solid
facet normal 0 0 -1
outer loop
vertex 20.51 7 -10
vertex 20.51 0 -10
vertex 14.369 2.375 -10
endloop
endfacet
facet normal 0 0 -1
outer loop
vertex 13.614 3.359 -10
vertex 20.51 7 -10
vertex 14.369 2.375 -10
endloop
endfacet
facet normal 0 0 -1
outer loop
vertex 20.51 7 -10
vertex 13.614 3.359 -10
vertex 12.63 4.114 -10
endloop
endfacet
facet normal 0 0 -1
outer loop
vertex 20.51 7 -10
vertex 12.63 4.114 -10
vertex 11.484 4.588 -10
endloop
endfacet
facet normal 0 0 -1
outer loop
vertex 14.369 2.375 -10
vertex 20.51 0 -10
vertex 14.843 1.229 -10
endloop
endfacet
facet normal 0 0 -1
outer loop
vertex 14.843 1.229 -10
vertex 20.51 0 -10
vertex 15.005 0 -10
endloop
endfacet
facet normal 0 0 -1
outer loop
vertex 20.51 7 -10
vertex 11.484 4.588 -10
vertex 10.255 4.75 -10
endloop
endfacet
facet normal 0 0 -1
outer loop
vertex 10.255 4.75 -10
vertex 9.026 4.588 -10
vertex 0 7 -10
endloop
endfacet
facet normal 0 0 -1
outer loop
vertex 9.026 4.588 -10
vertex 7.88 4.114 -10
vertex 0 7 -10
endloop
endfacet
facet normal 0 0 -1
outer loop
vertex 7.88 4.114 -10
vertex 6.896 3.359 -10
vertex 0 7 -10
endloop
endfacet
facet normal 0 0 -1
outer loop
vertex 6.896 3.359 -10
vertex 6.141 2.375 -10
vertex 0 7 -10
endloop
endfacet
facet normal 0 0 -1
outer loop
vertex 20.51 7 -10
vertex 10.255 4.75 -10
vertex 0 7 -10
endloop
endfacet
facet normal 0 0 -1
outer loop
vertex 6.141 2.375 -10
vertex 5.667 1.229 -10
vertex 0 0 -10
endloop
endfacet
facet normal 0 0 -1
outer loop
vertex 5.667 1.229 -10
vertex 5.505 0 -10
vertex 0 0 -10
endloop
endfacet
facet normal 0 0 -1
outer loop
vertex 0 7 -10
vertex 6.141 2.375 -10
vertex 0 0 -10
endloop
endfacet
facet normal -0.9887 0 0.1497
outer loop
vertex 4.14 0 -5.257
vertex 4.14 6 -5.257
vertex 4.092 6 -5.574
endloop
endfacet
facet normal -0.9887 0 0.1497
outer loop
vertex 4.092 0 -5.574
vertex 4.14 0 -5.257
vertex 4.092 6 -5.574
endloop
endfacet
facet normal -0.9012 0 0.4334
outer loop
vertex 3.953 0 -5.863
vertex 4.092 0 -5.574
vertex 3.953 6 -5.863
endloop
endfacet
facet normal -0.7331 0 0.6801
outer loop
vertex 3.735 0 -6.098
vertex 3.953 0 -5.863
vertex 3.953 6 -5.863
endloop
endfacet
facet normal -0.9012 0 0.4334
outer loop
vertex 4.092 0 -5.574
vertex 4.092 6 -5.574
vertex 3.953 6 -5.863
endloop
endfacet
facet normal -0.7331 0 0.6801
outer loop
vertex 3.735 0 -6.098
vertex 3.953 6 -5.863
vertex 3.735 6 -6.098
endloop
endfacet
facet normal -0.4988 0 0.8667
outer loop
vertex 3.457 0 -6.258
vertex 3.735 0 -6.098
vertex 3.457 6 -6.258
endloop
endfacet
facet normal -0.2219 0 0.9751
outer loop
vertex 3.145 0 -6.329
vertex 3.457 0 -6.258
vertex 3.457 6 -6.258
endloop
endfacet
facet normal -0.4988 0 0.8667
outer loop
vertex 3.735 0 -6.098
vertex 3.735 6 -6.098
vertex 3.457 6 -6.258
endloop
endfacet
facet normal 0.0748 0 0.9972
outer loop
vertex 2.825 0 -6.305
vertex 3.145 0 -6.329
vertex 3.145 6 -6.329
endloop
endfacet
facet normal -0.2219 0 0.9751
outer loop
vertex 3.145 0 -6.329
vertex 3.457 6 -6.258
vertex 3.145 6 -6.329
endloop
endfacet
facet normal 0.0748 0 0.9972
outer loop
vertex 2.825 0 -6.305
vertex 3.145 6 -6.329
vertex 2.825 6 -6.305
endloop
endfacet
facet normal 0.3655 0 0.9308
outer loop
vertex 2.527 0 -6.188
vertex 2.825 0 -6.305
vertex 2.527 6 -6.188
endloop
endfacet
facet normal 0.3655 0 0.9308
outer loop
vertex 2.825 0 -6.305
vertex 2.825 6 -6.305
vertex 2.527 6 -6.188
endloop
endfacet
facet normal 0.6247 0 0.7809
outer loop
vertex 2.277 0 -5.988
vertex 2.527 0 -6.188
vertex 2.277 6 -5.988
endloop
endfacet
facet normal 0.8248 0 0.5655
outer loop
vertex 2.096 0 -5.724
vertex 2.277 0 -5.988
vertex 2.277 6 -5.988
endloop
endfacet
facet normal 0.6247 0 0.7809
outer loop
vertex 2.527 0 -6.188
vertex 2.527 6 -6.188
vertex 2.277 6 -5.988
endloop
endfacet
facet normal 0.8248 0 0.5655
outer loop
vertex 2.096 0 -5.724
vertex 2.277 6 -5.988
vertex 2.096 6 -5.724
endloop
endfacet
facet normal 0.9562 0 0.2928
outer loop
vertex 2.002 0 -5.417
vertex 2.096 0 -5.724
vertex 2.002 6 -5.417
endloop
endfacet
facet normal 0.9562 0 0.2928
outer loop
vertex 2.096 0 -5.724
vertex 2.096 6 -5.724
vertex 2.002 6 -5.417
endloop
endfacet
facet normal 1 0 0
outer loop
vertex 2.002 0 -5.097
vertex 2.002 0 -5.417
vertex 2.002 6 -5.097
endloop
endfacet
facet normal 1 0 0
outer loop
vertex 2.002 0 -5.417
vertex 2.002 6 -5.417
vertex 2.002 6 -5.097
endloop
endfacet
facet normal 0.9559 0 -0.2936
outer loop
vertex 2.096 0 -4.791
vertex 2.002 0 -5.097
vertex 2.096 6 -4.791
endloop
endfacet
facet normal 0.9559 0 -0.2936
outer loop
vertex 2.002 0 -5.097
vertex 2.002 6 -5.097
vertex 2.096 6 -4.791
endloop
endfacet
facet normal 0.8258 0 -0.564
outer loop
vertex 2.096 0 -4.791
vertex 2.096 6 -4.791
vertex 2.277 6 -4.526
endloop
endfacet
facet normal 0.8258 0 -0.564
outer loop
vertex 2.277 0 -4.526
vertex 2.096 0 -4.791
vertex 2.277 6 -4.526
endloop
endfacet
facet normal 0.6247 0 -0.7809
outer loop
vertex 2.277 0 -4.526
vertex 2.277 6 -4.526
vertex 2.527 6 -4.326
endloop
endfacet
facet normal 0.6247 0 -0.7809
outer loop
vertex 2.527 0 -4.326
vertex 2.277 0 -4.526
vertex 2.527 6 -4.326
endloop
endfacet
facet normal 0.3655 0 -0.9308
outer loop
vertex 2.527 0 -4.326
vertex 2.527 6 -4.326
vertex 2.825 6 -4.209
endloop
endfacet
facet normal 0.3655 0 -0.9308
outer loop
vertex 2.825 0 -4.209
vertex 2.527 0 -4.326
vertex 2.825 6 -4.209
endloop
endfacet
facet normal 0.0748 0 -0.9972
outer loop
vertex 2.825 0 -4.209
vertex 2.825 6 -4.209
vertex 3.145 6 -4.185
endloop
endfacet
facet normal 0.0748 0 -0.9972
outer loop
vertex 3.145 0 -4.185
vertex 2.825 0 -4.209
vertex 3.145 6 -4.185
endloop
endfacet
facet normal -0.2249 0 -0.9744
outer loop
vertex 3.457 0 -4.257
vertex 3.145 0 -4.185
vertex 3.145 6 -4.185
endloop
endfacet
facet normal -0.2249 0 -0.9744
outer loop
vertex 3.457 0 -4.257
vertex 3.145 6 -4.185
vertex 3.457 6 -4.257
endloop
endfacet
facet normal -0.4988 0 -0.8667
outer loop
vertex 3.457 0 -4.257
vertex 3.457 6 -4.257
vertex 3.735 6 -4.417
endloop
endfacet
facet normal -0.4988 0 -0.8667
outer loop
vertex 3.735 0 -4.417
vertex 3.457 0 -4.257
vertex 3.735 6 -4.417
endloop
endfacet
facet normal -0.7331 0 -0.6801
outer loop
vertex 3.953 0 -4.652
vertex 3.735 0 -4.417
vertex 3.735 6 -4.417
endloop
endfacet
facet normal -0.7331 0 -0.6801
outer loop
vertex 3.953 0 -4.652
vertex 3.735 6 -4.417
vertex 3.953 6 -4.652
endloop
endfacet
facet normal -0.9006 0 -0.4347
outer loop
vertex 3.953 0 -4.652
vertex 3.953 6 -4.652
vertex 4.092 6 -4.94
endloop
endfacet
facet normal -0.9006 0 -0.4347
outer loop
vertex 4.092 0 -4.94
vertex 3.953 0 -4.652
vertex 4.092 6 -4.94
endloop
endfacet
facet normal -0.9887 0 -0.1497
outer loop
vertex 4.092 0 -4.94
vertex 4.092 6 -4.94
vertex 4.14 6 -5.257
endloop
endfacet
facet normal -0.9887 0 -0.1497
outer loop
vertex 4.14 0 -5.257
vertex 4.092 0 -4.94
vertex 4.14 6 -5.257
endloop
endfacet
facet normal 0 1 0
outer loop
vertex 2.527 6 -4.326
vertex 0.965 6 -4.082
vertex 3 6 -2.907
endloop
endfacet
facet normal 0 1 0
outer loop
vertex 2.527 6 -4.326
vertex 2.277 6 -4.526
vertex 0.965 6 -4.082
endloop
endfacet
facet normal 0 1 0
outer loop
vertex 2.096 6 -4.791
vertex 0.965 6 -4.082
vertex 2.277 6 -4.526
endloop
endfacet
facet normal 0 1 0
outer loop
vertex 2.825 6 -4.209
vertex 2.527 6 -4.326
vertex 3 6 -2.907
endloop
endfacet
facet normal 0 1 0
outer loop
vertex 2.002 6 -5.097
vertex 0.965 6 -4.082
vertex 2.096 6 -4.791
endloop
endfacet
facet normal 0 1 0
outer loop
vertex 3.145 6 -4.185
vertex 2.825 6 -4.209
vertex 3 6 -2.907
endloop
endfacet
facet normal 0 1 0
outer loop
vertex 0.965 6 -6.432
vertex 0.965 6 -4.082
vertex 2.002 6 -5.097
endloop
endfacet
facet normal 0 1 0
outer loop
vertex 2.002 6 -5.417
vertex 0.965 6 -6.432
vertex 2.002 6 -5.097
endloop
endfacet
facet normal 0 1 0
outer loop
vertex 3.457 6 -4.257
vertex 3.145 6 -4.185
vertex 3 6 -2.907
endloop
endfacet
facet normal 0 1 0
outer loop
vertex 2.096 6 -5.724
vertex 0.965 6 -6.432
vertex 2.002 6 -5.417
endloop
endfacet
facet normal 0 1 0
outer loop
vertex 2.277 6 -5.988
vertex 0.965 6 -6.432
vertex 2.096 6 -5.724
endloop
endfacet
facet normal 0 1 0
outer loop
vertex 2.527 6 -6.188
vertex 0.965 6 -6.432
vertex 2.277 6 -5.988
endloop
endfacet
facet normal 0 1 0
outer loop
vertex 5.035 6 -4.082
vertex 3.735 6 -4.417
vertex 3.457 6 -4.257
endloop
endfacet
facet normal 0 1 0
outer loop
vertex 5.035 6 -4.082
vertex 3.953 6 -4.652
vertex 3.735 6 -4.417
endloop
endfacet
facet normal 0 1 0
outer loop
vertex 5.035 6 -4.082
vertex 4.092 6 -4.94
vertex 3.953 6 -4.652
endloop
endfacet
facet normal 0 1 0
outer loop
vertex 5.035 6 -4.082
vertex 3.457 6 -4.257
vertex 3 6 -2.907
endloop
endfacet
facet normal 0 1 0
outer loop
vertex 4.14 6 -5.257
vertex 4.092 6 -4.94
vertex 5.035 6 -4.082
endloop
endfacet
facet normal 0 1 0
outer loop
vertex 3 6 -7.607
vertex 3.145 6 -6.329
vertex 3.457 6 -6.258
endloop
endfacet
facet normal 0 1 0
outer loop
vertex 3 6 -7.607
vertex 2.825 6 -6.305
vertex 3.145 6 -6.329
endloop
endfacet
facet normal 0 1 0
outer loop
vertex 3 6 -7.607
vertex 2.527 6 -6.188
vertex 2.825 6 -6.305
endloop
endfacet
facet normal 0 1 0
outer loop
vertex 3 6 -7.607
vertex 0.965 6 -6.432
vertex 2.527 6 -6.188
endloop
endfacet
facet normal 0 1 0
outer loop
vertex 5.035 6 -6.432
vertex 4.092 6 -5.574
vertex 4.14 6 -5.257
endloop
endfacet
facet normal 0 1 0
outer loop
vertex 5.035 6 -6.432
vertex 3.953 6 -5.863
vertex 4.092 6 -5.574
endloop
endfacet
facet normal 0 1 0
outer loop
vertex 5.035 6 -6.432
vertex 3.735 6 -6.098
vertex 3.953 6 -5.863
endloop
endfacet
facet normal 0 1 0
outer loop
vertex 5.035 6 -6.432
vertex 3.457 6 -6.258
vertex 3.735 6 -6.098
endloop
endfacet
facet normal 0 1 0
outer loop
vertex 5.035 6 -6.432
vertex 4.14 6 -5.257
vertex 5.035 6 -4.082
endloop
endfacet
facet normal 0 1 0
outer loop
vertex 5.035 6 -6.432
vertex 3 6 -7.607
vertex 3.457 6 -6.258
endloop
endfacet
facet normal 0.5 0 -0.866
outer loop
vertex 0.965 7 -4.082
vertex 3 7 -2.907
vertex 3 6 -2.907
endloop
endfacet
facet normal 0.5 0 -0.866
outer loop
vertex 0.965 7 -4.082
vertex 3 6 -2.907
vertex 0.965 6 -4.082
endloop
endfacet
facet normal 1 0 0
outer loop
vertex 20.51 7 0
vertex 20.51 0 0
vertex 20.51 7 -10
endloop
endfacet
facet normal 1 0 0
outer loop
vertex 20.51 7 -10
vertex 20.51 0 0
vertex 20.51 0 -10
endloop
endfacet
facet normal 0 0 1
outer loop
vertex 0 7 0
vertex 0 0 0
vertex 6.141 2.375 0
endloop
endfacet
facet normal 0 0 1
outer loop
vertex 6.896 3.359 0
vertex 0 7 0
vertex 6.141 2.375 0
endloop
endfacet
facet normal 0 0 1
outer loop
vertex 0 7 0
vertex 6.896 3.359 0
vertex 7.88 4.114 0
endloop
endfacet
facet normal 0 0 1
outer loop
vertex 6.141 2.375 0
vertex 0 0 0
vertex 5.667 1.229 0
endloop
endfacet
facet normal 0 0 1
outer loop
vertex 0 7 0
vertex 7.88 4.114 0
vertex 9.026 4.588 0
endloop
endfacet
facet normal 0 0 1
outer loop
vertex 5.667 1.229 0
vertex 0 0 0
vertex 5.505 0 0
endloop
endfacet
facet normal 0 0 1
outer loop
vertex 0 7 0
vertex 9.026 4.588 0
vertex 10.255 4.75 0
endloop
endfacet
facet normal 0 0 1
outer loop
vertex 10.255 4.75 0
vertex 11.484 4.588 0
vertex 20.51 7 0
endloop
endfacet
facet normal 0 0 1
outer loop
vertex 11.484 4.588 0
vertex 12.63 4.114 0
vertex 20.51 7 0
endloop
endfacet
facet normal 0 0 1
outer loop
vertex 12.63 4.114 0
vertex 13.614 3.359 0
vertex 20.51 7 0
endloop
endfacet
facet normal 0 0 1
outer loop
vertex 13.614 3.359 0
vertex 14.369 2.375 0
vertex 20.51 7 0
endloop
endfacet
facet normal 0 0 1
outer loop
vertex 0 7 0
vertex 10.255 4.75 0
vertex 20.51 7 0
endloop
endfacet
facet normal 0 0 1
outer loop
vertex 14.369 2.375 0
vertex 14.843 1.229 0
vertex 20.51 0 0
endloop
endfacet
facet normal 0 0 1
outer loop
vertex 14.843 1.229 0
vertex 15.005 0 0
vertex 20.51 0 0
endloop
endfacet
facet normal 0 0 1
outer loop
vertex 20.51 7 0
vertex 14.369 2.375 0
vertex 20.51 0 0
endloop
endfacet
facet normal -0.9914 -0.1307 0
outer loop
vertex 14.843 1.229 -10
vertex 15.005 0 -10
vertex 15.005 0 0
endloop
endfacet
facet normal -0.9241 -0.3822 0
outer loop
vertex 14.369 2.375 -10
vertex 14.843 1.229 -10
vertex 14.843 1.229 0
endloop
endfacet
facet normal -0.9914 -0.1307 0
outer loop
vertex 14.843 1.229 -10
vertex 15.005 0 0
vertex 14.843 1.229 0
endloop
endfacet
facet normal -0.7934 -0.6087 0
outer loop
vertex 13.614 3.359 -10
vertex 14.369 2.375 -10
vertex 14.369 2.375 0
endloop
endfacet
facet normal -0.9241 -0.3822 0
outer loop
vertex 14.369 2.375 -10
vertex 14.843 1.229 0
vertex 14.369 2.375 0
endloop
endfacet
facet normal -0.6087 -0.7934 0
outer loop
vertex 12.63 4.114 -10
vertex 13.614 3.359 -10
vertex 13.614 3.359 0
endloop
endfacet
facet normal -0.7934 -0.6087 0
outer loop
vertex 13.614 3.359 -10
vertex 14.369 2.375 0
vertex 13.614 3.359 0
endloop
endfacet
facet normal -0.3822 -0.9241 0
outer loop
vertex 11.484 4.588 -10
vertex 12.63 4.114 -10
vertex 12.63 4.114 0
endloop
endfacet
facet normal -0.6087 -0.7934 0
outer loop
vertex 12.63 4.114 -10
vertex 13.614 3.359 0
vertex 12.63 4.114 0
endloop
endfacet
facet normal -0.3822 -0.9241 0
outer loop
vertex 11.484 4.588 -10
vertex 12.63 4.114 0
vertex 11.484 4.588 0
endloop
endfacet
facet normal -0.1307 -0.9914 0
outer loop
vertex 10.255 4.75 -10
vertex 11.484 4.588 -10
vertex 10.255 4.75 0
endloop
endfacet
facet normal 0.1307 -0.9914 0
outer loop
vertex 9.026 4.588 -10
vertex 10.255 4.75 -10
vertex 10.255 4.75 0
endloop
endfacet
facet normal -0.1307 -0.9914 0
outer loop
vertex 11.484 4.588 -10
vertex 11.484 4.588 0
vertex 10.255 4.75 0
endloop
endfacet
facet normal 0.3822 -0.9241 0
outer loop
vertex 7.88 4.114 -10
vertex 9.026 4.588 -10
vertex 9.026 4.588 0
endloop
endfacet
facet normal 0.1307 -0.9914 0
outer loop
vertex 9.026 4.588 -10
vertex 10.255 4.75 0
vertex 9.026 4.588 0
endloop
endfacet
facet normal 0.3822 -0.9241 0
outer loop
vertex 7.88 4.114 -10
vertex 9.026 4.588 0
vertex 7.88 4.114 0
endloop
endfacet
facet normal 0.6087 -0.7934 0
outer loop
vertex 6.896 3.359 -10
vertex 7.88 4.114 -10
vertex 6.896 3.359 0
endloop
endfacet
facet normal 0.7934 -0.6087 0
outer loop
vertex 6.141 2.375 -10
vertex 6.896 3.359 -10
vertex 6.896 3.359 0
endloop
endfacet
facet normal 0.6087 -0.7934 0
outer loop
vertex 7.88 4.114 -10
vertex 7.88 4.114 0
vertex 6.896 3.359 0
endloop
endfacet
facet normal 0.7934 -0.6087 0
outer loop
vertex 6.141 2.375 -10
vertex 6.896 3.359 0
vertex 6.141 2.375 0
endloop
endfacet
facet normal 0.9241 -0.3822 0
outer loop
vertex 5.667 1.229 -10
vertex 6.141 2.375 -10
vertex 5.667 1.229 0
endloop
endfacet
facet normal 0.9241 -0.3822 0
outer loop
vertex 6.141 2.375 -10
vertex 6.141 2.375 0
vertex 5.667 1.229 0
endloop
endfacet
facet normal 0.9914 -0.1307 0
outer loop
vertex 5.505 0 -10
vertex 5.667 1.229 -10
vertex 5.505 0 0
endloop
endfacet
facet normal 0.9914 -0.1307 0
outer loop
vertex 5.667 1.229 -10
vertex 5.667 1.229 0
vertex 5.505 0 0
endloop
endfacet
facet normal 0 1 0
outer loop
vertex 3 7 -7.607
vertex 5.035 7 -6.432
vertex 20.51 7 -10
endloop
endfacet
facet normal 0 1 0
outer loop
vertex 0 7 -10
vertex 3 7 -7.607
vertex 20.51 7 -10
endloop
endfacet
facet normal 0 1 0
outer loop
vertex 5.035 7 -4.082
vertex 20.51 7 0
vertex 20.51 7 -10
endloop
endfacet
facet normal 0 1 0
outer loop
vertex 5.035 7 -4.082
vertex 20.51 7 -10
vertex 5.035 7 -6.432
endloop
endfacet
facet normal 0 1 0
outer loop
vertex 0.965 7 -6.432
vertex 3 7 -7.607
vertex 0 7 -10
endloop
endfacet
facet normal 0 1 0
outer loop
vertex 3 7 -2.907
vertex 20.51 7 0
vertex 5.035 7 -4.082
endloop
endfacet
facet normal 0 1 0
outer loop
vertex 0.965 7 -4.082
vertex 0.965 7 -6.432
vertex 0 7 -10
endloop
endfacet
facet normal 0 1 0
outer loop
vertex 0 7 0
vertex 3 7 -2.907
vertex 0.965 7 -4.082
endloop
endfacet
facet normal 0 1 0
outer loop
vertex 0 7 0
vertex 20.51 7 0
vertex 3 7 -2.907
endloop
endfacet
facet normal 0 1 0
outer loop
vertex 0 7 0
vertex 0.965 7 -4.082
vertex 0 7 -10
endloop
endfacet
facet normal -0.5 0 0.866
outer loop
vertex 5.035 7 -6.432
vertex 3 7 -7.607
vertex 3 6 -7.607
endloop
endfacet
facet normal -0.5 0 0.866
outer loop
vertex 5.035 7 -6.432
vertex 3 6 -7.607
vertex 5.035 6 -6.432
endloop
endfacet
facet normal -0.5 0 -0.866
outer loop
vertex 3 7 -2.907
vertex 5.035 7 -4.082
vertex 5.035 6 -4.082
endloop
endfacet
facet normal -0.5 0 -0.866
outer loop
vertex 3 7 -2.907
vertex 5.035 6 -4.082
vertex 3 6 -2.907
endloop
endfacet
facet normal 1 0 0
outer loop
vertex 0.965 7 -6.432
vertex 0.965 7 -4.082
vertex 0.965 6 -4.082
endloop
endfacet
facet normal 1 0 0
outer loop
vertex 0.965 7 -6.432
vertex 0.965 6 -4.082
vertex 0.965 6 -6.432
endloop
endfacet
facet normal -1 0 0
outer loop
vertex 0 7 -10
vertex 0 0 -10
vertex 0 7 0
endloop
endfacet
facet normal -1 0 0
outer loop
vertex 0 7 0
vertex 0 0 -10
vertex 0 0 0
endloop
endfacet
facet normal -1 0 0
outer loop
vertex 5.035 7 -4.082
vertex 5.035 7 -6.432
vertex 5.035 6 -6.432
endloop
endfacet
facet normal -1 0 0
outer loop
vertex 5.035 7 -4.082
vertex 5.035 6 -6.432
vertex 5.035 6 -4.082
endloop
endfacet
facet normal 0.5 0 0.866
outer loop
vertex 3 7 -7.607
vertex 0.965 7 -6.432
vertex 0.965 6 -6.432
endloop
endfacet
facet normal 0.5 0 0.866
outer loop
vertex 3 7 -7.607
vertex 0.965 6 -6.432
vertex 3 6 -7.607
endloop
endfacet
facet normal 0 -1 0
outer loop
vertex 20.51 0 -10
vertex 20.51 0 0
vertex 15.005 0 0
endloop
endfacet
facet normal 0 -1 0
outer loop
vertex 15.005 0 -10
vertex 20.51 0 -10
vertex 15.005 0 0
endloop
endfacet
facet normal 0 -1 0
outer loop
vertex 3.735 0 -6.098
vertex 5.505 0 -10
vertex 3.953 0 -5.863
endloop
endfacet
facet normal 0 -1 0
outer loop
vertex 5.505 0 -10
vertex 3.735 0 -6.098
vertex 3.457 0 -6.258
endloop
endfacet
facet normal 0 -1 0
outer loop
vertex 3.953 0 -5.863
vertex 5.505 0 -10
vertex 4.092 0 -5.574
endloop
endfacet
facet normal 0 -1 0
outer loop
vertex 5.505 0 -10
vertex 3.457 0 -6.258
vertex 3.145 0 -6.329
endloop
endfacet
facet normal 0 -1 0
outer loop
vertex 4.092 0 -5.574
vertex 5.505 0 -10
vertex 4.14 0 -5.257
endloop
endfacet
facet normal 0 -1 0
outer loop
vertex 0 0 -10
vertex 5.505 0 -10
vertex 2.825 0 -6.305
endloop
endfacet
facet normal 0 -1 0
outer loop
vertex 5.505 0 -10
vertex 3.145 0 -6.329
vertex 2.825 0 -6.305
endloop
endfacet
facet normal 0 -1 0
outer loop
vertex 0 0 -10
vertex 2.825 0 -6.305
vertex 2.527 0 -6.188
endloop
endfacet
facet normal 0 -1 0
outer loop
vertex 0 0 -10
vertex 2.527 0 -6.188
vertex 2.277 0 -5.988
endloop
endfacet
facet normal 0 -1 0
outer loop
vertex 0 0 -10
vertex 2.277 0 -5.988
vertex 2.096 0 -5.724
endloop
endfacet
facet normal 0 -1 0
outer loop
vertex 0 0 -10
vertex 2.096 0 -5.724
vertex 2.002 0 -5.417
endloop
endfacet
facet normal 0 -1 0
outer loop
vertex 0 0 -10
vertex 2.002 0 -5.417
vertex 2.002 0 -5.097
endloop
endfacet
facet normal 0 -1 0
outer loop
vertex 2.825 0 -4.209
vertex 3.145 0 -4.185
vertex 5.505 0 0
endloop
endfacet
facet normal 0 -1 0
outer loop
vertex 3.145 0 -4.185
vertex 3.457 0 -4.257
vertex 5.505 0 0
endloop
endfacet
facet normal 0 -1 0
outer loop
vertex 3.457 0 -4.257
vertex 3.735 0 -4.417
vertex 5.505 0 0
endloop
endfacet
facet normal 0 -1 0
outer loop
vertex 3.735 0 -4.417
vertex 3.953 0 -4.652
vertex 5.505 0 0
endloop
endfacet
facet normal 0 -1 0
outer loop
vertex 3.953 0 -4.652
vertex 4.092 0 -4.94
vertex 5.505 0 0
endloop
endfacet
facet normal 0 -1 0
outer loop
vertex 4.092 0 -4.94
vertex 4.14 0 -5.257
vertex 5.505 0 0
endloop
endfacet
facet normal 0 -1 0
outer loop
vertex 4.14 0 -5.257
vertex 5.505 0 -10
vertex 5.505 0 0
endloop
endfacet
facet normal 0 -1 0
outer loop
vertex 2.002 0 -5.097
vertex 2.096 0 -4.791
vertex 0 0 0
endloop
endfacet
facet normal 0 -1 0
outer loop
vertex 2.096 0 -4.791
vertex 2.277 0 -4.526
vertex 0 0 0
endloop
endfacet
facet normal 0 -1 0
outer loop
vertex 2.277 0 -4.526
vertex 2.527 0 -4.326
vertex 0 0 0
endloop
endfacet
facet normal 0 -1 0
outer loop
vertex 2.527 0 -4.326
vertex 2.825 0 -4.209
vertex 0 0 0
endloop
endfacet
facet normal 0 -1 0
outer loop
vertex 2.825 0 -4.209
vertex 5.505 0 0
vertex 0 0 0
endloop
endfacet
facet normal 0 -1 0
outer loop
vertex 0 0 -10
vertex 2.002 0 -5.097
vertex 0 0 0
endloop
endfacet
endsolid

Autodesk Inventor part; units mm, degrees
ref_plane "YZ Plane" through (0, 0, 0) normal (1, 0, 0) x (0, 1, 0)
ref_plane "XZ Plane" through (0, 0, 0) normal (0, 1, 0) x (-1, 0, 0)
ref_plane "XY Plane" through (0, 0, 0) normal (0, 0, 1) x (1, 0, 0)
sketch "Sketch1" plane through (0, 0, 0) normal (0, 1, 0) x (-1, 0, 0)
  line L0 (0, 0) -> (-20.51, 0)
  line L1 (-20.51, 0) -> (-20.51, -10)
  line L2 (-20.51, -10) -> (0, -10)
  line L3 (0, -10) -> (0, 0)
  dimension "d0" = 20.51
  dimension "d1" = 10
extrude "Extrusion1" add sketch "Sketch1" along normal blind 7
sketch "Sketch2" plane through (0, 0, 0) normal (0, 0, 1) x (1, 0, 0)
  line L0 (20.51, 0) -> (0, 0) projected
  circle A0 centre (10.255, 0) radius 4.75
  dimension "d4" = 9.5
extrude "Extrusion2" cut sketch "Sketch2" against normal through all
sketch "Sketch3" plane through (0, 7, 0) normal (0, 1, 0) x (1, 0, 0)
  line L0 (3, 7.6072) -> (5.0352, 6.4322)
  line L1 (5.0352, 6.4322) -> (5.0352, 4.0822)
  line L2 (5.0352, 4.0822) -> (3, 2.9072)
  line L3 (3, 2.9072) -> (0.9648, 4.0822)
  line L4 (0.9648, 4.0822) -> (0.9648, 6.4322)
  line L5 (0.9648, 6.4322) -> (3, 7.6072)
  point P0 (0, 0)
  point P1 (3, 5.2572)
extrude "Extrusion3" cut sketch "Sketch3" against normal blind 1
sketch "Sketch4" plane through (0, 6, 0) normal (0, 1, 0) x (1, 0, 0)
  circle A0 centre (3.0647, 5.2572) radius 1.075
  point P0 (0, 0)
  dimension "d10" = 2.15
extrude "Extrusion4" cut sketch "Sketch4" against normal through all
properties part number "dg_clampv2"
